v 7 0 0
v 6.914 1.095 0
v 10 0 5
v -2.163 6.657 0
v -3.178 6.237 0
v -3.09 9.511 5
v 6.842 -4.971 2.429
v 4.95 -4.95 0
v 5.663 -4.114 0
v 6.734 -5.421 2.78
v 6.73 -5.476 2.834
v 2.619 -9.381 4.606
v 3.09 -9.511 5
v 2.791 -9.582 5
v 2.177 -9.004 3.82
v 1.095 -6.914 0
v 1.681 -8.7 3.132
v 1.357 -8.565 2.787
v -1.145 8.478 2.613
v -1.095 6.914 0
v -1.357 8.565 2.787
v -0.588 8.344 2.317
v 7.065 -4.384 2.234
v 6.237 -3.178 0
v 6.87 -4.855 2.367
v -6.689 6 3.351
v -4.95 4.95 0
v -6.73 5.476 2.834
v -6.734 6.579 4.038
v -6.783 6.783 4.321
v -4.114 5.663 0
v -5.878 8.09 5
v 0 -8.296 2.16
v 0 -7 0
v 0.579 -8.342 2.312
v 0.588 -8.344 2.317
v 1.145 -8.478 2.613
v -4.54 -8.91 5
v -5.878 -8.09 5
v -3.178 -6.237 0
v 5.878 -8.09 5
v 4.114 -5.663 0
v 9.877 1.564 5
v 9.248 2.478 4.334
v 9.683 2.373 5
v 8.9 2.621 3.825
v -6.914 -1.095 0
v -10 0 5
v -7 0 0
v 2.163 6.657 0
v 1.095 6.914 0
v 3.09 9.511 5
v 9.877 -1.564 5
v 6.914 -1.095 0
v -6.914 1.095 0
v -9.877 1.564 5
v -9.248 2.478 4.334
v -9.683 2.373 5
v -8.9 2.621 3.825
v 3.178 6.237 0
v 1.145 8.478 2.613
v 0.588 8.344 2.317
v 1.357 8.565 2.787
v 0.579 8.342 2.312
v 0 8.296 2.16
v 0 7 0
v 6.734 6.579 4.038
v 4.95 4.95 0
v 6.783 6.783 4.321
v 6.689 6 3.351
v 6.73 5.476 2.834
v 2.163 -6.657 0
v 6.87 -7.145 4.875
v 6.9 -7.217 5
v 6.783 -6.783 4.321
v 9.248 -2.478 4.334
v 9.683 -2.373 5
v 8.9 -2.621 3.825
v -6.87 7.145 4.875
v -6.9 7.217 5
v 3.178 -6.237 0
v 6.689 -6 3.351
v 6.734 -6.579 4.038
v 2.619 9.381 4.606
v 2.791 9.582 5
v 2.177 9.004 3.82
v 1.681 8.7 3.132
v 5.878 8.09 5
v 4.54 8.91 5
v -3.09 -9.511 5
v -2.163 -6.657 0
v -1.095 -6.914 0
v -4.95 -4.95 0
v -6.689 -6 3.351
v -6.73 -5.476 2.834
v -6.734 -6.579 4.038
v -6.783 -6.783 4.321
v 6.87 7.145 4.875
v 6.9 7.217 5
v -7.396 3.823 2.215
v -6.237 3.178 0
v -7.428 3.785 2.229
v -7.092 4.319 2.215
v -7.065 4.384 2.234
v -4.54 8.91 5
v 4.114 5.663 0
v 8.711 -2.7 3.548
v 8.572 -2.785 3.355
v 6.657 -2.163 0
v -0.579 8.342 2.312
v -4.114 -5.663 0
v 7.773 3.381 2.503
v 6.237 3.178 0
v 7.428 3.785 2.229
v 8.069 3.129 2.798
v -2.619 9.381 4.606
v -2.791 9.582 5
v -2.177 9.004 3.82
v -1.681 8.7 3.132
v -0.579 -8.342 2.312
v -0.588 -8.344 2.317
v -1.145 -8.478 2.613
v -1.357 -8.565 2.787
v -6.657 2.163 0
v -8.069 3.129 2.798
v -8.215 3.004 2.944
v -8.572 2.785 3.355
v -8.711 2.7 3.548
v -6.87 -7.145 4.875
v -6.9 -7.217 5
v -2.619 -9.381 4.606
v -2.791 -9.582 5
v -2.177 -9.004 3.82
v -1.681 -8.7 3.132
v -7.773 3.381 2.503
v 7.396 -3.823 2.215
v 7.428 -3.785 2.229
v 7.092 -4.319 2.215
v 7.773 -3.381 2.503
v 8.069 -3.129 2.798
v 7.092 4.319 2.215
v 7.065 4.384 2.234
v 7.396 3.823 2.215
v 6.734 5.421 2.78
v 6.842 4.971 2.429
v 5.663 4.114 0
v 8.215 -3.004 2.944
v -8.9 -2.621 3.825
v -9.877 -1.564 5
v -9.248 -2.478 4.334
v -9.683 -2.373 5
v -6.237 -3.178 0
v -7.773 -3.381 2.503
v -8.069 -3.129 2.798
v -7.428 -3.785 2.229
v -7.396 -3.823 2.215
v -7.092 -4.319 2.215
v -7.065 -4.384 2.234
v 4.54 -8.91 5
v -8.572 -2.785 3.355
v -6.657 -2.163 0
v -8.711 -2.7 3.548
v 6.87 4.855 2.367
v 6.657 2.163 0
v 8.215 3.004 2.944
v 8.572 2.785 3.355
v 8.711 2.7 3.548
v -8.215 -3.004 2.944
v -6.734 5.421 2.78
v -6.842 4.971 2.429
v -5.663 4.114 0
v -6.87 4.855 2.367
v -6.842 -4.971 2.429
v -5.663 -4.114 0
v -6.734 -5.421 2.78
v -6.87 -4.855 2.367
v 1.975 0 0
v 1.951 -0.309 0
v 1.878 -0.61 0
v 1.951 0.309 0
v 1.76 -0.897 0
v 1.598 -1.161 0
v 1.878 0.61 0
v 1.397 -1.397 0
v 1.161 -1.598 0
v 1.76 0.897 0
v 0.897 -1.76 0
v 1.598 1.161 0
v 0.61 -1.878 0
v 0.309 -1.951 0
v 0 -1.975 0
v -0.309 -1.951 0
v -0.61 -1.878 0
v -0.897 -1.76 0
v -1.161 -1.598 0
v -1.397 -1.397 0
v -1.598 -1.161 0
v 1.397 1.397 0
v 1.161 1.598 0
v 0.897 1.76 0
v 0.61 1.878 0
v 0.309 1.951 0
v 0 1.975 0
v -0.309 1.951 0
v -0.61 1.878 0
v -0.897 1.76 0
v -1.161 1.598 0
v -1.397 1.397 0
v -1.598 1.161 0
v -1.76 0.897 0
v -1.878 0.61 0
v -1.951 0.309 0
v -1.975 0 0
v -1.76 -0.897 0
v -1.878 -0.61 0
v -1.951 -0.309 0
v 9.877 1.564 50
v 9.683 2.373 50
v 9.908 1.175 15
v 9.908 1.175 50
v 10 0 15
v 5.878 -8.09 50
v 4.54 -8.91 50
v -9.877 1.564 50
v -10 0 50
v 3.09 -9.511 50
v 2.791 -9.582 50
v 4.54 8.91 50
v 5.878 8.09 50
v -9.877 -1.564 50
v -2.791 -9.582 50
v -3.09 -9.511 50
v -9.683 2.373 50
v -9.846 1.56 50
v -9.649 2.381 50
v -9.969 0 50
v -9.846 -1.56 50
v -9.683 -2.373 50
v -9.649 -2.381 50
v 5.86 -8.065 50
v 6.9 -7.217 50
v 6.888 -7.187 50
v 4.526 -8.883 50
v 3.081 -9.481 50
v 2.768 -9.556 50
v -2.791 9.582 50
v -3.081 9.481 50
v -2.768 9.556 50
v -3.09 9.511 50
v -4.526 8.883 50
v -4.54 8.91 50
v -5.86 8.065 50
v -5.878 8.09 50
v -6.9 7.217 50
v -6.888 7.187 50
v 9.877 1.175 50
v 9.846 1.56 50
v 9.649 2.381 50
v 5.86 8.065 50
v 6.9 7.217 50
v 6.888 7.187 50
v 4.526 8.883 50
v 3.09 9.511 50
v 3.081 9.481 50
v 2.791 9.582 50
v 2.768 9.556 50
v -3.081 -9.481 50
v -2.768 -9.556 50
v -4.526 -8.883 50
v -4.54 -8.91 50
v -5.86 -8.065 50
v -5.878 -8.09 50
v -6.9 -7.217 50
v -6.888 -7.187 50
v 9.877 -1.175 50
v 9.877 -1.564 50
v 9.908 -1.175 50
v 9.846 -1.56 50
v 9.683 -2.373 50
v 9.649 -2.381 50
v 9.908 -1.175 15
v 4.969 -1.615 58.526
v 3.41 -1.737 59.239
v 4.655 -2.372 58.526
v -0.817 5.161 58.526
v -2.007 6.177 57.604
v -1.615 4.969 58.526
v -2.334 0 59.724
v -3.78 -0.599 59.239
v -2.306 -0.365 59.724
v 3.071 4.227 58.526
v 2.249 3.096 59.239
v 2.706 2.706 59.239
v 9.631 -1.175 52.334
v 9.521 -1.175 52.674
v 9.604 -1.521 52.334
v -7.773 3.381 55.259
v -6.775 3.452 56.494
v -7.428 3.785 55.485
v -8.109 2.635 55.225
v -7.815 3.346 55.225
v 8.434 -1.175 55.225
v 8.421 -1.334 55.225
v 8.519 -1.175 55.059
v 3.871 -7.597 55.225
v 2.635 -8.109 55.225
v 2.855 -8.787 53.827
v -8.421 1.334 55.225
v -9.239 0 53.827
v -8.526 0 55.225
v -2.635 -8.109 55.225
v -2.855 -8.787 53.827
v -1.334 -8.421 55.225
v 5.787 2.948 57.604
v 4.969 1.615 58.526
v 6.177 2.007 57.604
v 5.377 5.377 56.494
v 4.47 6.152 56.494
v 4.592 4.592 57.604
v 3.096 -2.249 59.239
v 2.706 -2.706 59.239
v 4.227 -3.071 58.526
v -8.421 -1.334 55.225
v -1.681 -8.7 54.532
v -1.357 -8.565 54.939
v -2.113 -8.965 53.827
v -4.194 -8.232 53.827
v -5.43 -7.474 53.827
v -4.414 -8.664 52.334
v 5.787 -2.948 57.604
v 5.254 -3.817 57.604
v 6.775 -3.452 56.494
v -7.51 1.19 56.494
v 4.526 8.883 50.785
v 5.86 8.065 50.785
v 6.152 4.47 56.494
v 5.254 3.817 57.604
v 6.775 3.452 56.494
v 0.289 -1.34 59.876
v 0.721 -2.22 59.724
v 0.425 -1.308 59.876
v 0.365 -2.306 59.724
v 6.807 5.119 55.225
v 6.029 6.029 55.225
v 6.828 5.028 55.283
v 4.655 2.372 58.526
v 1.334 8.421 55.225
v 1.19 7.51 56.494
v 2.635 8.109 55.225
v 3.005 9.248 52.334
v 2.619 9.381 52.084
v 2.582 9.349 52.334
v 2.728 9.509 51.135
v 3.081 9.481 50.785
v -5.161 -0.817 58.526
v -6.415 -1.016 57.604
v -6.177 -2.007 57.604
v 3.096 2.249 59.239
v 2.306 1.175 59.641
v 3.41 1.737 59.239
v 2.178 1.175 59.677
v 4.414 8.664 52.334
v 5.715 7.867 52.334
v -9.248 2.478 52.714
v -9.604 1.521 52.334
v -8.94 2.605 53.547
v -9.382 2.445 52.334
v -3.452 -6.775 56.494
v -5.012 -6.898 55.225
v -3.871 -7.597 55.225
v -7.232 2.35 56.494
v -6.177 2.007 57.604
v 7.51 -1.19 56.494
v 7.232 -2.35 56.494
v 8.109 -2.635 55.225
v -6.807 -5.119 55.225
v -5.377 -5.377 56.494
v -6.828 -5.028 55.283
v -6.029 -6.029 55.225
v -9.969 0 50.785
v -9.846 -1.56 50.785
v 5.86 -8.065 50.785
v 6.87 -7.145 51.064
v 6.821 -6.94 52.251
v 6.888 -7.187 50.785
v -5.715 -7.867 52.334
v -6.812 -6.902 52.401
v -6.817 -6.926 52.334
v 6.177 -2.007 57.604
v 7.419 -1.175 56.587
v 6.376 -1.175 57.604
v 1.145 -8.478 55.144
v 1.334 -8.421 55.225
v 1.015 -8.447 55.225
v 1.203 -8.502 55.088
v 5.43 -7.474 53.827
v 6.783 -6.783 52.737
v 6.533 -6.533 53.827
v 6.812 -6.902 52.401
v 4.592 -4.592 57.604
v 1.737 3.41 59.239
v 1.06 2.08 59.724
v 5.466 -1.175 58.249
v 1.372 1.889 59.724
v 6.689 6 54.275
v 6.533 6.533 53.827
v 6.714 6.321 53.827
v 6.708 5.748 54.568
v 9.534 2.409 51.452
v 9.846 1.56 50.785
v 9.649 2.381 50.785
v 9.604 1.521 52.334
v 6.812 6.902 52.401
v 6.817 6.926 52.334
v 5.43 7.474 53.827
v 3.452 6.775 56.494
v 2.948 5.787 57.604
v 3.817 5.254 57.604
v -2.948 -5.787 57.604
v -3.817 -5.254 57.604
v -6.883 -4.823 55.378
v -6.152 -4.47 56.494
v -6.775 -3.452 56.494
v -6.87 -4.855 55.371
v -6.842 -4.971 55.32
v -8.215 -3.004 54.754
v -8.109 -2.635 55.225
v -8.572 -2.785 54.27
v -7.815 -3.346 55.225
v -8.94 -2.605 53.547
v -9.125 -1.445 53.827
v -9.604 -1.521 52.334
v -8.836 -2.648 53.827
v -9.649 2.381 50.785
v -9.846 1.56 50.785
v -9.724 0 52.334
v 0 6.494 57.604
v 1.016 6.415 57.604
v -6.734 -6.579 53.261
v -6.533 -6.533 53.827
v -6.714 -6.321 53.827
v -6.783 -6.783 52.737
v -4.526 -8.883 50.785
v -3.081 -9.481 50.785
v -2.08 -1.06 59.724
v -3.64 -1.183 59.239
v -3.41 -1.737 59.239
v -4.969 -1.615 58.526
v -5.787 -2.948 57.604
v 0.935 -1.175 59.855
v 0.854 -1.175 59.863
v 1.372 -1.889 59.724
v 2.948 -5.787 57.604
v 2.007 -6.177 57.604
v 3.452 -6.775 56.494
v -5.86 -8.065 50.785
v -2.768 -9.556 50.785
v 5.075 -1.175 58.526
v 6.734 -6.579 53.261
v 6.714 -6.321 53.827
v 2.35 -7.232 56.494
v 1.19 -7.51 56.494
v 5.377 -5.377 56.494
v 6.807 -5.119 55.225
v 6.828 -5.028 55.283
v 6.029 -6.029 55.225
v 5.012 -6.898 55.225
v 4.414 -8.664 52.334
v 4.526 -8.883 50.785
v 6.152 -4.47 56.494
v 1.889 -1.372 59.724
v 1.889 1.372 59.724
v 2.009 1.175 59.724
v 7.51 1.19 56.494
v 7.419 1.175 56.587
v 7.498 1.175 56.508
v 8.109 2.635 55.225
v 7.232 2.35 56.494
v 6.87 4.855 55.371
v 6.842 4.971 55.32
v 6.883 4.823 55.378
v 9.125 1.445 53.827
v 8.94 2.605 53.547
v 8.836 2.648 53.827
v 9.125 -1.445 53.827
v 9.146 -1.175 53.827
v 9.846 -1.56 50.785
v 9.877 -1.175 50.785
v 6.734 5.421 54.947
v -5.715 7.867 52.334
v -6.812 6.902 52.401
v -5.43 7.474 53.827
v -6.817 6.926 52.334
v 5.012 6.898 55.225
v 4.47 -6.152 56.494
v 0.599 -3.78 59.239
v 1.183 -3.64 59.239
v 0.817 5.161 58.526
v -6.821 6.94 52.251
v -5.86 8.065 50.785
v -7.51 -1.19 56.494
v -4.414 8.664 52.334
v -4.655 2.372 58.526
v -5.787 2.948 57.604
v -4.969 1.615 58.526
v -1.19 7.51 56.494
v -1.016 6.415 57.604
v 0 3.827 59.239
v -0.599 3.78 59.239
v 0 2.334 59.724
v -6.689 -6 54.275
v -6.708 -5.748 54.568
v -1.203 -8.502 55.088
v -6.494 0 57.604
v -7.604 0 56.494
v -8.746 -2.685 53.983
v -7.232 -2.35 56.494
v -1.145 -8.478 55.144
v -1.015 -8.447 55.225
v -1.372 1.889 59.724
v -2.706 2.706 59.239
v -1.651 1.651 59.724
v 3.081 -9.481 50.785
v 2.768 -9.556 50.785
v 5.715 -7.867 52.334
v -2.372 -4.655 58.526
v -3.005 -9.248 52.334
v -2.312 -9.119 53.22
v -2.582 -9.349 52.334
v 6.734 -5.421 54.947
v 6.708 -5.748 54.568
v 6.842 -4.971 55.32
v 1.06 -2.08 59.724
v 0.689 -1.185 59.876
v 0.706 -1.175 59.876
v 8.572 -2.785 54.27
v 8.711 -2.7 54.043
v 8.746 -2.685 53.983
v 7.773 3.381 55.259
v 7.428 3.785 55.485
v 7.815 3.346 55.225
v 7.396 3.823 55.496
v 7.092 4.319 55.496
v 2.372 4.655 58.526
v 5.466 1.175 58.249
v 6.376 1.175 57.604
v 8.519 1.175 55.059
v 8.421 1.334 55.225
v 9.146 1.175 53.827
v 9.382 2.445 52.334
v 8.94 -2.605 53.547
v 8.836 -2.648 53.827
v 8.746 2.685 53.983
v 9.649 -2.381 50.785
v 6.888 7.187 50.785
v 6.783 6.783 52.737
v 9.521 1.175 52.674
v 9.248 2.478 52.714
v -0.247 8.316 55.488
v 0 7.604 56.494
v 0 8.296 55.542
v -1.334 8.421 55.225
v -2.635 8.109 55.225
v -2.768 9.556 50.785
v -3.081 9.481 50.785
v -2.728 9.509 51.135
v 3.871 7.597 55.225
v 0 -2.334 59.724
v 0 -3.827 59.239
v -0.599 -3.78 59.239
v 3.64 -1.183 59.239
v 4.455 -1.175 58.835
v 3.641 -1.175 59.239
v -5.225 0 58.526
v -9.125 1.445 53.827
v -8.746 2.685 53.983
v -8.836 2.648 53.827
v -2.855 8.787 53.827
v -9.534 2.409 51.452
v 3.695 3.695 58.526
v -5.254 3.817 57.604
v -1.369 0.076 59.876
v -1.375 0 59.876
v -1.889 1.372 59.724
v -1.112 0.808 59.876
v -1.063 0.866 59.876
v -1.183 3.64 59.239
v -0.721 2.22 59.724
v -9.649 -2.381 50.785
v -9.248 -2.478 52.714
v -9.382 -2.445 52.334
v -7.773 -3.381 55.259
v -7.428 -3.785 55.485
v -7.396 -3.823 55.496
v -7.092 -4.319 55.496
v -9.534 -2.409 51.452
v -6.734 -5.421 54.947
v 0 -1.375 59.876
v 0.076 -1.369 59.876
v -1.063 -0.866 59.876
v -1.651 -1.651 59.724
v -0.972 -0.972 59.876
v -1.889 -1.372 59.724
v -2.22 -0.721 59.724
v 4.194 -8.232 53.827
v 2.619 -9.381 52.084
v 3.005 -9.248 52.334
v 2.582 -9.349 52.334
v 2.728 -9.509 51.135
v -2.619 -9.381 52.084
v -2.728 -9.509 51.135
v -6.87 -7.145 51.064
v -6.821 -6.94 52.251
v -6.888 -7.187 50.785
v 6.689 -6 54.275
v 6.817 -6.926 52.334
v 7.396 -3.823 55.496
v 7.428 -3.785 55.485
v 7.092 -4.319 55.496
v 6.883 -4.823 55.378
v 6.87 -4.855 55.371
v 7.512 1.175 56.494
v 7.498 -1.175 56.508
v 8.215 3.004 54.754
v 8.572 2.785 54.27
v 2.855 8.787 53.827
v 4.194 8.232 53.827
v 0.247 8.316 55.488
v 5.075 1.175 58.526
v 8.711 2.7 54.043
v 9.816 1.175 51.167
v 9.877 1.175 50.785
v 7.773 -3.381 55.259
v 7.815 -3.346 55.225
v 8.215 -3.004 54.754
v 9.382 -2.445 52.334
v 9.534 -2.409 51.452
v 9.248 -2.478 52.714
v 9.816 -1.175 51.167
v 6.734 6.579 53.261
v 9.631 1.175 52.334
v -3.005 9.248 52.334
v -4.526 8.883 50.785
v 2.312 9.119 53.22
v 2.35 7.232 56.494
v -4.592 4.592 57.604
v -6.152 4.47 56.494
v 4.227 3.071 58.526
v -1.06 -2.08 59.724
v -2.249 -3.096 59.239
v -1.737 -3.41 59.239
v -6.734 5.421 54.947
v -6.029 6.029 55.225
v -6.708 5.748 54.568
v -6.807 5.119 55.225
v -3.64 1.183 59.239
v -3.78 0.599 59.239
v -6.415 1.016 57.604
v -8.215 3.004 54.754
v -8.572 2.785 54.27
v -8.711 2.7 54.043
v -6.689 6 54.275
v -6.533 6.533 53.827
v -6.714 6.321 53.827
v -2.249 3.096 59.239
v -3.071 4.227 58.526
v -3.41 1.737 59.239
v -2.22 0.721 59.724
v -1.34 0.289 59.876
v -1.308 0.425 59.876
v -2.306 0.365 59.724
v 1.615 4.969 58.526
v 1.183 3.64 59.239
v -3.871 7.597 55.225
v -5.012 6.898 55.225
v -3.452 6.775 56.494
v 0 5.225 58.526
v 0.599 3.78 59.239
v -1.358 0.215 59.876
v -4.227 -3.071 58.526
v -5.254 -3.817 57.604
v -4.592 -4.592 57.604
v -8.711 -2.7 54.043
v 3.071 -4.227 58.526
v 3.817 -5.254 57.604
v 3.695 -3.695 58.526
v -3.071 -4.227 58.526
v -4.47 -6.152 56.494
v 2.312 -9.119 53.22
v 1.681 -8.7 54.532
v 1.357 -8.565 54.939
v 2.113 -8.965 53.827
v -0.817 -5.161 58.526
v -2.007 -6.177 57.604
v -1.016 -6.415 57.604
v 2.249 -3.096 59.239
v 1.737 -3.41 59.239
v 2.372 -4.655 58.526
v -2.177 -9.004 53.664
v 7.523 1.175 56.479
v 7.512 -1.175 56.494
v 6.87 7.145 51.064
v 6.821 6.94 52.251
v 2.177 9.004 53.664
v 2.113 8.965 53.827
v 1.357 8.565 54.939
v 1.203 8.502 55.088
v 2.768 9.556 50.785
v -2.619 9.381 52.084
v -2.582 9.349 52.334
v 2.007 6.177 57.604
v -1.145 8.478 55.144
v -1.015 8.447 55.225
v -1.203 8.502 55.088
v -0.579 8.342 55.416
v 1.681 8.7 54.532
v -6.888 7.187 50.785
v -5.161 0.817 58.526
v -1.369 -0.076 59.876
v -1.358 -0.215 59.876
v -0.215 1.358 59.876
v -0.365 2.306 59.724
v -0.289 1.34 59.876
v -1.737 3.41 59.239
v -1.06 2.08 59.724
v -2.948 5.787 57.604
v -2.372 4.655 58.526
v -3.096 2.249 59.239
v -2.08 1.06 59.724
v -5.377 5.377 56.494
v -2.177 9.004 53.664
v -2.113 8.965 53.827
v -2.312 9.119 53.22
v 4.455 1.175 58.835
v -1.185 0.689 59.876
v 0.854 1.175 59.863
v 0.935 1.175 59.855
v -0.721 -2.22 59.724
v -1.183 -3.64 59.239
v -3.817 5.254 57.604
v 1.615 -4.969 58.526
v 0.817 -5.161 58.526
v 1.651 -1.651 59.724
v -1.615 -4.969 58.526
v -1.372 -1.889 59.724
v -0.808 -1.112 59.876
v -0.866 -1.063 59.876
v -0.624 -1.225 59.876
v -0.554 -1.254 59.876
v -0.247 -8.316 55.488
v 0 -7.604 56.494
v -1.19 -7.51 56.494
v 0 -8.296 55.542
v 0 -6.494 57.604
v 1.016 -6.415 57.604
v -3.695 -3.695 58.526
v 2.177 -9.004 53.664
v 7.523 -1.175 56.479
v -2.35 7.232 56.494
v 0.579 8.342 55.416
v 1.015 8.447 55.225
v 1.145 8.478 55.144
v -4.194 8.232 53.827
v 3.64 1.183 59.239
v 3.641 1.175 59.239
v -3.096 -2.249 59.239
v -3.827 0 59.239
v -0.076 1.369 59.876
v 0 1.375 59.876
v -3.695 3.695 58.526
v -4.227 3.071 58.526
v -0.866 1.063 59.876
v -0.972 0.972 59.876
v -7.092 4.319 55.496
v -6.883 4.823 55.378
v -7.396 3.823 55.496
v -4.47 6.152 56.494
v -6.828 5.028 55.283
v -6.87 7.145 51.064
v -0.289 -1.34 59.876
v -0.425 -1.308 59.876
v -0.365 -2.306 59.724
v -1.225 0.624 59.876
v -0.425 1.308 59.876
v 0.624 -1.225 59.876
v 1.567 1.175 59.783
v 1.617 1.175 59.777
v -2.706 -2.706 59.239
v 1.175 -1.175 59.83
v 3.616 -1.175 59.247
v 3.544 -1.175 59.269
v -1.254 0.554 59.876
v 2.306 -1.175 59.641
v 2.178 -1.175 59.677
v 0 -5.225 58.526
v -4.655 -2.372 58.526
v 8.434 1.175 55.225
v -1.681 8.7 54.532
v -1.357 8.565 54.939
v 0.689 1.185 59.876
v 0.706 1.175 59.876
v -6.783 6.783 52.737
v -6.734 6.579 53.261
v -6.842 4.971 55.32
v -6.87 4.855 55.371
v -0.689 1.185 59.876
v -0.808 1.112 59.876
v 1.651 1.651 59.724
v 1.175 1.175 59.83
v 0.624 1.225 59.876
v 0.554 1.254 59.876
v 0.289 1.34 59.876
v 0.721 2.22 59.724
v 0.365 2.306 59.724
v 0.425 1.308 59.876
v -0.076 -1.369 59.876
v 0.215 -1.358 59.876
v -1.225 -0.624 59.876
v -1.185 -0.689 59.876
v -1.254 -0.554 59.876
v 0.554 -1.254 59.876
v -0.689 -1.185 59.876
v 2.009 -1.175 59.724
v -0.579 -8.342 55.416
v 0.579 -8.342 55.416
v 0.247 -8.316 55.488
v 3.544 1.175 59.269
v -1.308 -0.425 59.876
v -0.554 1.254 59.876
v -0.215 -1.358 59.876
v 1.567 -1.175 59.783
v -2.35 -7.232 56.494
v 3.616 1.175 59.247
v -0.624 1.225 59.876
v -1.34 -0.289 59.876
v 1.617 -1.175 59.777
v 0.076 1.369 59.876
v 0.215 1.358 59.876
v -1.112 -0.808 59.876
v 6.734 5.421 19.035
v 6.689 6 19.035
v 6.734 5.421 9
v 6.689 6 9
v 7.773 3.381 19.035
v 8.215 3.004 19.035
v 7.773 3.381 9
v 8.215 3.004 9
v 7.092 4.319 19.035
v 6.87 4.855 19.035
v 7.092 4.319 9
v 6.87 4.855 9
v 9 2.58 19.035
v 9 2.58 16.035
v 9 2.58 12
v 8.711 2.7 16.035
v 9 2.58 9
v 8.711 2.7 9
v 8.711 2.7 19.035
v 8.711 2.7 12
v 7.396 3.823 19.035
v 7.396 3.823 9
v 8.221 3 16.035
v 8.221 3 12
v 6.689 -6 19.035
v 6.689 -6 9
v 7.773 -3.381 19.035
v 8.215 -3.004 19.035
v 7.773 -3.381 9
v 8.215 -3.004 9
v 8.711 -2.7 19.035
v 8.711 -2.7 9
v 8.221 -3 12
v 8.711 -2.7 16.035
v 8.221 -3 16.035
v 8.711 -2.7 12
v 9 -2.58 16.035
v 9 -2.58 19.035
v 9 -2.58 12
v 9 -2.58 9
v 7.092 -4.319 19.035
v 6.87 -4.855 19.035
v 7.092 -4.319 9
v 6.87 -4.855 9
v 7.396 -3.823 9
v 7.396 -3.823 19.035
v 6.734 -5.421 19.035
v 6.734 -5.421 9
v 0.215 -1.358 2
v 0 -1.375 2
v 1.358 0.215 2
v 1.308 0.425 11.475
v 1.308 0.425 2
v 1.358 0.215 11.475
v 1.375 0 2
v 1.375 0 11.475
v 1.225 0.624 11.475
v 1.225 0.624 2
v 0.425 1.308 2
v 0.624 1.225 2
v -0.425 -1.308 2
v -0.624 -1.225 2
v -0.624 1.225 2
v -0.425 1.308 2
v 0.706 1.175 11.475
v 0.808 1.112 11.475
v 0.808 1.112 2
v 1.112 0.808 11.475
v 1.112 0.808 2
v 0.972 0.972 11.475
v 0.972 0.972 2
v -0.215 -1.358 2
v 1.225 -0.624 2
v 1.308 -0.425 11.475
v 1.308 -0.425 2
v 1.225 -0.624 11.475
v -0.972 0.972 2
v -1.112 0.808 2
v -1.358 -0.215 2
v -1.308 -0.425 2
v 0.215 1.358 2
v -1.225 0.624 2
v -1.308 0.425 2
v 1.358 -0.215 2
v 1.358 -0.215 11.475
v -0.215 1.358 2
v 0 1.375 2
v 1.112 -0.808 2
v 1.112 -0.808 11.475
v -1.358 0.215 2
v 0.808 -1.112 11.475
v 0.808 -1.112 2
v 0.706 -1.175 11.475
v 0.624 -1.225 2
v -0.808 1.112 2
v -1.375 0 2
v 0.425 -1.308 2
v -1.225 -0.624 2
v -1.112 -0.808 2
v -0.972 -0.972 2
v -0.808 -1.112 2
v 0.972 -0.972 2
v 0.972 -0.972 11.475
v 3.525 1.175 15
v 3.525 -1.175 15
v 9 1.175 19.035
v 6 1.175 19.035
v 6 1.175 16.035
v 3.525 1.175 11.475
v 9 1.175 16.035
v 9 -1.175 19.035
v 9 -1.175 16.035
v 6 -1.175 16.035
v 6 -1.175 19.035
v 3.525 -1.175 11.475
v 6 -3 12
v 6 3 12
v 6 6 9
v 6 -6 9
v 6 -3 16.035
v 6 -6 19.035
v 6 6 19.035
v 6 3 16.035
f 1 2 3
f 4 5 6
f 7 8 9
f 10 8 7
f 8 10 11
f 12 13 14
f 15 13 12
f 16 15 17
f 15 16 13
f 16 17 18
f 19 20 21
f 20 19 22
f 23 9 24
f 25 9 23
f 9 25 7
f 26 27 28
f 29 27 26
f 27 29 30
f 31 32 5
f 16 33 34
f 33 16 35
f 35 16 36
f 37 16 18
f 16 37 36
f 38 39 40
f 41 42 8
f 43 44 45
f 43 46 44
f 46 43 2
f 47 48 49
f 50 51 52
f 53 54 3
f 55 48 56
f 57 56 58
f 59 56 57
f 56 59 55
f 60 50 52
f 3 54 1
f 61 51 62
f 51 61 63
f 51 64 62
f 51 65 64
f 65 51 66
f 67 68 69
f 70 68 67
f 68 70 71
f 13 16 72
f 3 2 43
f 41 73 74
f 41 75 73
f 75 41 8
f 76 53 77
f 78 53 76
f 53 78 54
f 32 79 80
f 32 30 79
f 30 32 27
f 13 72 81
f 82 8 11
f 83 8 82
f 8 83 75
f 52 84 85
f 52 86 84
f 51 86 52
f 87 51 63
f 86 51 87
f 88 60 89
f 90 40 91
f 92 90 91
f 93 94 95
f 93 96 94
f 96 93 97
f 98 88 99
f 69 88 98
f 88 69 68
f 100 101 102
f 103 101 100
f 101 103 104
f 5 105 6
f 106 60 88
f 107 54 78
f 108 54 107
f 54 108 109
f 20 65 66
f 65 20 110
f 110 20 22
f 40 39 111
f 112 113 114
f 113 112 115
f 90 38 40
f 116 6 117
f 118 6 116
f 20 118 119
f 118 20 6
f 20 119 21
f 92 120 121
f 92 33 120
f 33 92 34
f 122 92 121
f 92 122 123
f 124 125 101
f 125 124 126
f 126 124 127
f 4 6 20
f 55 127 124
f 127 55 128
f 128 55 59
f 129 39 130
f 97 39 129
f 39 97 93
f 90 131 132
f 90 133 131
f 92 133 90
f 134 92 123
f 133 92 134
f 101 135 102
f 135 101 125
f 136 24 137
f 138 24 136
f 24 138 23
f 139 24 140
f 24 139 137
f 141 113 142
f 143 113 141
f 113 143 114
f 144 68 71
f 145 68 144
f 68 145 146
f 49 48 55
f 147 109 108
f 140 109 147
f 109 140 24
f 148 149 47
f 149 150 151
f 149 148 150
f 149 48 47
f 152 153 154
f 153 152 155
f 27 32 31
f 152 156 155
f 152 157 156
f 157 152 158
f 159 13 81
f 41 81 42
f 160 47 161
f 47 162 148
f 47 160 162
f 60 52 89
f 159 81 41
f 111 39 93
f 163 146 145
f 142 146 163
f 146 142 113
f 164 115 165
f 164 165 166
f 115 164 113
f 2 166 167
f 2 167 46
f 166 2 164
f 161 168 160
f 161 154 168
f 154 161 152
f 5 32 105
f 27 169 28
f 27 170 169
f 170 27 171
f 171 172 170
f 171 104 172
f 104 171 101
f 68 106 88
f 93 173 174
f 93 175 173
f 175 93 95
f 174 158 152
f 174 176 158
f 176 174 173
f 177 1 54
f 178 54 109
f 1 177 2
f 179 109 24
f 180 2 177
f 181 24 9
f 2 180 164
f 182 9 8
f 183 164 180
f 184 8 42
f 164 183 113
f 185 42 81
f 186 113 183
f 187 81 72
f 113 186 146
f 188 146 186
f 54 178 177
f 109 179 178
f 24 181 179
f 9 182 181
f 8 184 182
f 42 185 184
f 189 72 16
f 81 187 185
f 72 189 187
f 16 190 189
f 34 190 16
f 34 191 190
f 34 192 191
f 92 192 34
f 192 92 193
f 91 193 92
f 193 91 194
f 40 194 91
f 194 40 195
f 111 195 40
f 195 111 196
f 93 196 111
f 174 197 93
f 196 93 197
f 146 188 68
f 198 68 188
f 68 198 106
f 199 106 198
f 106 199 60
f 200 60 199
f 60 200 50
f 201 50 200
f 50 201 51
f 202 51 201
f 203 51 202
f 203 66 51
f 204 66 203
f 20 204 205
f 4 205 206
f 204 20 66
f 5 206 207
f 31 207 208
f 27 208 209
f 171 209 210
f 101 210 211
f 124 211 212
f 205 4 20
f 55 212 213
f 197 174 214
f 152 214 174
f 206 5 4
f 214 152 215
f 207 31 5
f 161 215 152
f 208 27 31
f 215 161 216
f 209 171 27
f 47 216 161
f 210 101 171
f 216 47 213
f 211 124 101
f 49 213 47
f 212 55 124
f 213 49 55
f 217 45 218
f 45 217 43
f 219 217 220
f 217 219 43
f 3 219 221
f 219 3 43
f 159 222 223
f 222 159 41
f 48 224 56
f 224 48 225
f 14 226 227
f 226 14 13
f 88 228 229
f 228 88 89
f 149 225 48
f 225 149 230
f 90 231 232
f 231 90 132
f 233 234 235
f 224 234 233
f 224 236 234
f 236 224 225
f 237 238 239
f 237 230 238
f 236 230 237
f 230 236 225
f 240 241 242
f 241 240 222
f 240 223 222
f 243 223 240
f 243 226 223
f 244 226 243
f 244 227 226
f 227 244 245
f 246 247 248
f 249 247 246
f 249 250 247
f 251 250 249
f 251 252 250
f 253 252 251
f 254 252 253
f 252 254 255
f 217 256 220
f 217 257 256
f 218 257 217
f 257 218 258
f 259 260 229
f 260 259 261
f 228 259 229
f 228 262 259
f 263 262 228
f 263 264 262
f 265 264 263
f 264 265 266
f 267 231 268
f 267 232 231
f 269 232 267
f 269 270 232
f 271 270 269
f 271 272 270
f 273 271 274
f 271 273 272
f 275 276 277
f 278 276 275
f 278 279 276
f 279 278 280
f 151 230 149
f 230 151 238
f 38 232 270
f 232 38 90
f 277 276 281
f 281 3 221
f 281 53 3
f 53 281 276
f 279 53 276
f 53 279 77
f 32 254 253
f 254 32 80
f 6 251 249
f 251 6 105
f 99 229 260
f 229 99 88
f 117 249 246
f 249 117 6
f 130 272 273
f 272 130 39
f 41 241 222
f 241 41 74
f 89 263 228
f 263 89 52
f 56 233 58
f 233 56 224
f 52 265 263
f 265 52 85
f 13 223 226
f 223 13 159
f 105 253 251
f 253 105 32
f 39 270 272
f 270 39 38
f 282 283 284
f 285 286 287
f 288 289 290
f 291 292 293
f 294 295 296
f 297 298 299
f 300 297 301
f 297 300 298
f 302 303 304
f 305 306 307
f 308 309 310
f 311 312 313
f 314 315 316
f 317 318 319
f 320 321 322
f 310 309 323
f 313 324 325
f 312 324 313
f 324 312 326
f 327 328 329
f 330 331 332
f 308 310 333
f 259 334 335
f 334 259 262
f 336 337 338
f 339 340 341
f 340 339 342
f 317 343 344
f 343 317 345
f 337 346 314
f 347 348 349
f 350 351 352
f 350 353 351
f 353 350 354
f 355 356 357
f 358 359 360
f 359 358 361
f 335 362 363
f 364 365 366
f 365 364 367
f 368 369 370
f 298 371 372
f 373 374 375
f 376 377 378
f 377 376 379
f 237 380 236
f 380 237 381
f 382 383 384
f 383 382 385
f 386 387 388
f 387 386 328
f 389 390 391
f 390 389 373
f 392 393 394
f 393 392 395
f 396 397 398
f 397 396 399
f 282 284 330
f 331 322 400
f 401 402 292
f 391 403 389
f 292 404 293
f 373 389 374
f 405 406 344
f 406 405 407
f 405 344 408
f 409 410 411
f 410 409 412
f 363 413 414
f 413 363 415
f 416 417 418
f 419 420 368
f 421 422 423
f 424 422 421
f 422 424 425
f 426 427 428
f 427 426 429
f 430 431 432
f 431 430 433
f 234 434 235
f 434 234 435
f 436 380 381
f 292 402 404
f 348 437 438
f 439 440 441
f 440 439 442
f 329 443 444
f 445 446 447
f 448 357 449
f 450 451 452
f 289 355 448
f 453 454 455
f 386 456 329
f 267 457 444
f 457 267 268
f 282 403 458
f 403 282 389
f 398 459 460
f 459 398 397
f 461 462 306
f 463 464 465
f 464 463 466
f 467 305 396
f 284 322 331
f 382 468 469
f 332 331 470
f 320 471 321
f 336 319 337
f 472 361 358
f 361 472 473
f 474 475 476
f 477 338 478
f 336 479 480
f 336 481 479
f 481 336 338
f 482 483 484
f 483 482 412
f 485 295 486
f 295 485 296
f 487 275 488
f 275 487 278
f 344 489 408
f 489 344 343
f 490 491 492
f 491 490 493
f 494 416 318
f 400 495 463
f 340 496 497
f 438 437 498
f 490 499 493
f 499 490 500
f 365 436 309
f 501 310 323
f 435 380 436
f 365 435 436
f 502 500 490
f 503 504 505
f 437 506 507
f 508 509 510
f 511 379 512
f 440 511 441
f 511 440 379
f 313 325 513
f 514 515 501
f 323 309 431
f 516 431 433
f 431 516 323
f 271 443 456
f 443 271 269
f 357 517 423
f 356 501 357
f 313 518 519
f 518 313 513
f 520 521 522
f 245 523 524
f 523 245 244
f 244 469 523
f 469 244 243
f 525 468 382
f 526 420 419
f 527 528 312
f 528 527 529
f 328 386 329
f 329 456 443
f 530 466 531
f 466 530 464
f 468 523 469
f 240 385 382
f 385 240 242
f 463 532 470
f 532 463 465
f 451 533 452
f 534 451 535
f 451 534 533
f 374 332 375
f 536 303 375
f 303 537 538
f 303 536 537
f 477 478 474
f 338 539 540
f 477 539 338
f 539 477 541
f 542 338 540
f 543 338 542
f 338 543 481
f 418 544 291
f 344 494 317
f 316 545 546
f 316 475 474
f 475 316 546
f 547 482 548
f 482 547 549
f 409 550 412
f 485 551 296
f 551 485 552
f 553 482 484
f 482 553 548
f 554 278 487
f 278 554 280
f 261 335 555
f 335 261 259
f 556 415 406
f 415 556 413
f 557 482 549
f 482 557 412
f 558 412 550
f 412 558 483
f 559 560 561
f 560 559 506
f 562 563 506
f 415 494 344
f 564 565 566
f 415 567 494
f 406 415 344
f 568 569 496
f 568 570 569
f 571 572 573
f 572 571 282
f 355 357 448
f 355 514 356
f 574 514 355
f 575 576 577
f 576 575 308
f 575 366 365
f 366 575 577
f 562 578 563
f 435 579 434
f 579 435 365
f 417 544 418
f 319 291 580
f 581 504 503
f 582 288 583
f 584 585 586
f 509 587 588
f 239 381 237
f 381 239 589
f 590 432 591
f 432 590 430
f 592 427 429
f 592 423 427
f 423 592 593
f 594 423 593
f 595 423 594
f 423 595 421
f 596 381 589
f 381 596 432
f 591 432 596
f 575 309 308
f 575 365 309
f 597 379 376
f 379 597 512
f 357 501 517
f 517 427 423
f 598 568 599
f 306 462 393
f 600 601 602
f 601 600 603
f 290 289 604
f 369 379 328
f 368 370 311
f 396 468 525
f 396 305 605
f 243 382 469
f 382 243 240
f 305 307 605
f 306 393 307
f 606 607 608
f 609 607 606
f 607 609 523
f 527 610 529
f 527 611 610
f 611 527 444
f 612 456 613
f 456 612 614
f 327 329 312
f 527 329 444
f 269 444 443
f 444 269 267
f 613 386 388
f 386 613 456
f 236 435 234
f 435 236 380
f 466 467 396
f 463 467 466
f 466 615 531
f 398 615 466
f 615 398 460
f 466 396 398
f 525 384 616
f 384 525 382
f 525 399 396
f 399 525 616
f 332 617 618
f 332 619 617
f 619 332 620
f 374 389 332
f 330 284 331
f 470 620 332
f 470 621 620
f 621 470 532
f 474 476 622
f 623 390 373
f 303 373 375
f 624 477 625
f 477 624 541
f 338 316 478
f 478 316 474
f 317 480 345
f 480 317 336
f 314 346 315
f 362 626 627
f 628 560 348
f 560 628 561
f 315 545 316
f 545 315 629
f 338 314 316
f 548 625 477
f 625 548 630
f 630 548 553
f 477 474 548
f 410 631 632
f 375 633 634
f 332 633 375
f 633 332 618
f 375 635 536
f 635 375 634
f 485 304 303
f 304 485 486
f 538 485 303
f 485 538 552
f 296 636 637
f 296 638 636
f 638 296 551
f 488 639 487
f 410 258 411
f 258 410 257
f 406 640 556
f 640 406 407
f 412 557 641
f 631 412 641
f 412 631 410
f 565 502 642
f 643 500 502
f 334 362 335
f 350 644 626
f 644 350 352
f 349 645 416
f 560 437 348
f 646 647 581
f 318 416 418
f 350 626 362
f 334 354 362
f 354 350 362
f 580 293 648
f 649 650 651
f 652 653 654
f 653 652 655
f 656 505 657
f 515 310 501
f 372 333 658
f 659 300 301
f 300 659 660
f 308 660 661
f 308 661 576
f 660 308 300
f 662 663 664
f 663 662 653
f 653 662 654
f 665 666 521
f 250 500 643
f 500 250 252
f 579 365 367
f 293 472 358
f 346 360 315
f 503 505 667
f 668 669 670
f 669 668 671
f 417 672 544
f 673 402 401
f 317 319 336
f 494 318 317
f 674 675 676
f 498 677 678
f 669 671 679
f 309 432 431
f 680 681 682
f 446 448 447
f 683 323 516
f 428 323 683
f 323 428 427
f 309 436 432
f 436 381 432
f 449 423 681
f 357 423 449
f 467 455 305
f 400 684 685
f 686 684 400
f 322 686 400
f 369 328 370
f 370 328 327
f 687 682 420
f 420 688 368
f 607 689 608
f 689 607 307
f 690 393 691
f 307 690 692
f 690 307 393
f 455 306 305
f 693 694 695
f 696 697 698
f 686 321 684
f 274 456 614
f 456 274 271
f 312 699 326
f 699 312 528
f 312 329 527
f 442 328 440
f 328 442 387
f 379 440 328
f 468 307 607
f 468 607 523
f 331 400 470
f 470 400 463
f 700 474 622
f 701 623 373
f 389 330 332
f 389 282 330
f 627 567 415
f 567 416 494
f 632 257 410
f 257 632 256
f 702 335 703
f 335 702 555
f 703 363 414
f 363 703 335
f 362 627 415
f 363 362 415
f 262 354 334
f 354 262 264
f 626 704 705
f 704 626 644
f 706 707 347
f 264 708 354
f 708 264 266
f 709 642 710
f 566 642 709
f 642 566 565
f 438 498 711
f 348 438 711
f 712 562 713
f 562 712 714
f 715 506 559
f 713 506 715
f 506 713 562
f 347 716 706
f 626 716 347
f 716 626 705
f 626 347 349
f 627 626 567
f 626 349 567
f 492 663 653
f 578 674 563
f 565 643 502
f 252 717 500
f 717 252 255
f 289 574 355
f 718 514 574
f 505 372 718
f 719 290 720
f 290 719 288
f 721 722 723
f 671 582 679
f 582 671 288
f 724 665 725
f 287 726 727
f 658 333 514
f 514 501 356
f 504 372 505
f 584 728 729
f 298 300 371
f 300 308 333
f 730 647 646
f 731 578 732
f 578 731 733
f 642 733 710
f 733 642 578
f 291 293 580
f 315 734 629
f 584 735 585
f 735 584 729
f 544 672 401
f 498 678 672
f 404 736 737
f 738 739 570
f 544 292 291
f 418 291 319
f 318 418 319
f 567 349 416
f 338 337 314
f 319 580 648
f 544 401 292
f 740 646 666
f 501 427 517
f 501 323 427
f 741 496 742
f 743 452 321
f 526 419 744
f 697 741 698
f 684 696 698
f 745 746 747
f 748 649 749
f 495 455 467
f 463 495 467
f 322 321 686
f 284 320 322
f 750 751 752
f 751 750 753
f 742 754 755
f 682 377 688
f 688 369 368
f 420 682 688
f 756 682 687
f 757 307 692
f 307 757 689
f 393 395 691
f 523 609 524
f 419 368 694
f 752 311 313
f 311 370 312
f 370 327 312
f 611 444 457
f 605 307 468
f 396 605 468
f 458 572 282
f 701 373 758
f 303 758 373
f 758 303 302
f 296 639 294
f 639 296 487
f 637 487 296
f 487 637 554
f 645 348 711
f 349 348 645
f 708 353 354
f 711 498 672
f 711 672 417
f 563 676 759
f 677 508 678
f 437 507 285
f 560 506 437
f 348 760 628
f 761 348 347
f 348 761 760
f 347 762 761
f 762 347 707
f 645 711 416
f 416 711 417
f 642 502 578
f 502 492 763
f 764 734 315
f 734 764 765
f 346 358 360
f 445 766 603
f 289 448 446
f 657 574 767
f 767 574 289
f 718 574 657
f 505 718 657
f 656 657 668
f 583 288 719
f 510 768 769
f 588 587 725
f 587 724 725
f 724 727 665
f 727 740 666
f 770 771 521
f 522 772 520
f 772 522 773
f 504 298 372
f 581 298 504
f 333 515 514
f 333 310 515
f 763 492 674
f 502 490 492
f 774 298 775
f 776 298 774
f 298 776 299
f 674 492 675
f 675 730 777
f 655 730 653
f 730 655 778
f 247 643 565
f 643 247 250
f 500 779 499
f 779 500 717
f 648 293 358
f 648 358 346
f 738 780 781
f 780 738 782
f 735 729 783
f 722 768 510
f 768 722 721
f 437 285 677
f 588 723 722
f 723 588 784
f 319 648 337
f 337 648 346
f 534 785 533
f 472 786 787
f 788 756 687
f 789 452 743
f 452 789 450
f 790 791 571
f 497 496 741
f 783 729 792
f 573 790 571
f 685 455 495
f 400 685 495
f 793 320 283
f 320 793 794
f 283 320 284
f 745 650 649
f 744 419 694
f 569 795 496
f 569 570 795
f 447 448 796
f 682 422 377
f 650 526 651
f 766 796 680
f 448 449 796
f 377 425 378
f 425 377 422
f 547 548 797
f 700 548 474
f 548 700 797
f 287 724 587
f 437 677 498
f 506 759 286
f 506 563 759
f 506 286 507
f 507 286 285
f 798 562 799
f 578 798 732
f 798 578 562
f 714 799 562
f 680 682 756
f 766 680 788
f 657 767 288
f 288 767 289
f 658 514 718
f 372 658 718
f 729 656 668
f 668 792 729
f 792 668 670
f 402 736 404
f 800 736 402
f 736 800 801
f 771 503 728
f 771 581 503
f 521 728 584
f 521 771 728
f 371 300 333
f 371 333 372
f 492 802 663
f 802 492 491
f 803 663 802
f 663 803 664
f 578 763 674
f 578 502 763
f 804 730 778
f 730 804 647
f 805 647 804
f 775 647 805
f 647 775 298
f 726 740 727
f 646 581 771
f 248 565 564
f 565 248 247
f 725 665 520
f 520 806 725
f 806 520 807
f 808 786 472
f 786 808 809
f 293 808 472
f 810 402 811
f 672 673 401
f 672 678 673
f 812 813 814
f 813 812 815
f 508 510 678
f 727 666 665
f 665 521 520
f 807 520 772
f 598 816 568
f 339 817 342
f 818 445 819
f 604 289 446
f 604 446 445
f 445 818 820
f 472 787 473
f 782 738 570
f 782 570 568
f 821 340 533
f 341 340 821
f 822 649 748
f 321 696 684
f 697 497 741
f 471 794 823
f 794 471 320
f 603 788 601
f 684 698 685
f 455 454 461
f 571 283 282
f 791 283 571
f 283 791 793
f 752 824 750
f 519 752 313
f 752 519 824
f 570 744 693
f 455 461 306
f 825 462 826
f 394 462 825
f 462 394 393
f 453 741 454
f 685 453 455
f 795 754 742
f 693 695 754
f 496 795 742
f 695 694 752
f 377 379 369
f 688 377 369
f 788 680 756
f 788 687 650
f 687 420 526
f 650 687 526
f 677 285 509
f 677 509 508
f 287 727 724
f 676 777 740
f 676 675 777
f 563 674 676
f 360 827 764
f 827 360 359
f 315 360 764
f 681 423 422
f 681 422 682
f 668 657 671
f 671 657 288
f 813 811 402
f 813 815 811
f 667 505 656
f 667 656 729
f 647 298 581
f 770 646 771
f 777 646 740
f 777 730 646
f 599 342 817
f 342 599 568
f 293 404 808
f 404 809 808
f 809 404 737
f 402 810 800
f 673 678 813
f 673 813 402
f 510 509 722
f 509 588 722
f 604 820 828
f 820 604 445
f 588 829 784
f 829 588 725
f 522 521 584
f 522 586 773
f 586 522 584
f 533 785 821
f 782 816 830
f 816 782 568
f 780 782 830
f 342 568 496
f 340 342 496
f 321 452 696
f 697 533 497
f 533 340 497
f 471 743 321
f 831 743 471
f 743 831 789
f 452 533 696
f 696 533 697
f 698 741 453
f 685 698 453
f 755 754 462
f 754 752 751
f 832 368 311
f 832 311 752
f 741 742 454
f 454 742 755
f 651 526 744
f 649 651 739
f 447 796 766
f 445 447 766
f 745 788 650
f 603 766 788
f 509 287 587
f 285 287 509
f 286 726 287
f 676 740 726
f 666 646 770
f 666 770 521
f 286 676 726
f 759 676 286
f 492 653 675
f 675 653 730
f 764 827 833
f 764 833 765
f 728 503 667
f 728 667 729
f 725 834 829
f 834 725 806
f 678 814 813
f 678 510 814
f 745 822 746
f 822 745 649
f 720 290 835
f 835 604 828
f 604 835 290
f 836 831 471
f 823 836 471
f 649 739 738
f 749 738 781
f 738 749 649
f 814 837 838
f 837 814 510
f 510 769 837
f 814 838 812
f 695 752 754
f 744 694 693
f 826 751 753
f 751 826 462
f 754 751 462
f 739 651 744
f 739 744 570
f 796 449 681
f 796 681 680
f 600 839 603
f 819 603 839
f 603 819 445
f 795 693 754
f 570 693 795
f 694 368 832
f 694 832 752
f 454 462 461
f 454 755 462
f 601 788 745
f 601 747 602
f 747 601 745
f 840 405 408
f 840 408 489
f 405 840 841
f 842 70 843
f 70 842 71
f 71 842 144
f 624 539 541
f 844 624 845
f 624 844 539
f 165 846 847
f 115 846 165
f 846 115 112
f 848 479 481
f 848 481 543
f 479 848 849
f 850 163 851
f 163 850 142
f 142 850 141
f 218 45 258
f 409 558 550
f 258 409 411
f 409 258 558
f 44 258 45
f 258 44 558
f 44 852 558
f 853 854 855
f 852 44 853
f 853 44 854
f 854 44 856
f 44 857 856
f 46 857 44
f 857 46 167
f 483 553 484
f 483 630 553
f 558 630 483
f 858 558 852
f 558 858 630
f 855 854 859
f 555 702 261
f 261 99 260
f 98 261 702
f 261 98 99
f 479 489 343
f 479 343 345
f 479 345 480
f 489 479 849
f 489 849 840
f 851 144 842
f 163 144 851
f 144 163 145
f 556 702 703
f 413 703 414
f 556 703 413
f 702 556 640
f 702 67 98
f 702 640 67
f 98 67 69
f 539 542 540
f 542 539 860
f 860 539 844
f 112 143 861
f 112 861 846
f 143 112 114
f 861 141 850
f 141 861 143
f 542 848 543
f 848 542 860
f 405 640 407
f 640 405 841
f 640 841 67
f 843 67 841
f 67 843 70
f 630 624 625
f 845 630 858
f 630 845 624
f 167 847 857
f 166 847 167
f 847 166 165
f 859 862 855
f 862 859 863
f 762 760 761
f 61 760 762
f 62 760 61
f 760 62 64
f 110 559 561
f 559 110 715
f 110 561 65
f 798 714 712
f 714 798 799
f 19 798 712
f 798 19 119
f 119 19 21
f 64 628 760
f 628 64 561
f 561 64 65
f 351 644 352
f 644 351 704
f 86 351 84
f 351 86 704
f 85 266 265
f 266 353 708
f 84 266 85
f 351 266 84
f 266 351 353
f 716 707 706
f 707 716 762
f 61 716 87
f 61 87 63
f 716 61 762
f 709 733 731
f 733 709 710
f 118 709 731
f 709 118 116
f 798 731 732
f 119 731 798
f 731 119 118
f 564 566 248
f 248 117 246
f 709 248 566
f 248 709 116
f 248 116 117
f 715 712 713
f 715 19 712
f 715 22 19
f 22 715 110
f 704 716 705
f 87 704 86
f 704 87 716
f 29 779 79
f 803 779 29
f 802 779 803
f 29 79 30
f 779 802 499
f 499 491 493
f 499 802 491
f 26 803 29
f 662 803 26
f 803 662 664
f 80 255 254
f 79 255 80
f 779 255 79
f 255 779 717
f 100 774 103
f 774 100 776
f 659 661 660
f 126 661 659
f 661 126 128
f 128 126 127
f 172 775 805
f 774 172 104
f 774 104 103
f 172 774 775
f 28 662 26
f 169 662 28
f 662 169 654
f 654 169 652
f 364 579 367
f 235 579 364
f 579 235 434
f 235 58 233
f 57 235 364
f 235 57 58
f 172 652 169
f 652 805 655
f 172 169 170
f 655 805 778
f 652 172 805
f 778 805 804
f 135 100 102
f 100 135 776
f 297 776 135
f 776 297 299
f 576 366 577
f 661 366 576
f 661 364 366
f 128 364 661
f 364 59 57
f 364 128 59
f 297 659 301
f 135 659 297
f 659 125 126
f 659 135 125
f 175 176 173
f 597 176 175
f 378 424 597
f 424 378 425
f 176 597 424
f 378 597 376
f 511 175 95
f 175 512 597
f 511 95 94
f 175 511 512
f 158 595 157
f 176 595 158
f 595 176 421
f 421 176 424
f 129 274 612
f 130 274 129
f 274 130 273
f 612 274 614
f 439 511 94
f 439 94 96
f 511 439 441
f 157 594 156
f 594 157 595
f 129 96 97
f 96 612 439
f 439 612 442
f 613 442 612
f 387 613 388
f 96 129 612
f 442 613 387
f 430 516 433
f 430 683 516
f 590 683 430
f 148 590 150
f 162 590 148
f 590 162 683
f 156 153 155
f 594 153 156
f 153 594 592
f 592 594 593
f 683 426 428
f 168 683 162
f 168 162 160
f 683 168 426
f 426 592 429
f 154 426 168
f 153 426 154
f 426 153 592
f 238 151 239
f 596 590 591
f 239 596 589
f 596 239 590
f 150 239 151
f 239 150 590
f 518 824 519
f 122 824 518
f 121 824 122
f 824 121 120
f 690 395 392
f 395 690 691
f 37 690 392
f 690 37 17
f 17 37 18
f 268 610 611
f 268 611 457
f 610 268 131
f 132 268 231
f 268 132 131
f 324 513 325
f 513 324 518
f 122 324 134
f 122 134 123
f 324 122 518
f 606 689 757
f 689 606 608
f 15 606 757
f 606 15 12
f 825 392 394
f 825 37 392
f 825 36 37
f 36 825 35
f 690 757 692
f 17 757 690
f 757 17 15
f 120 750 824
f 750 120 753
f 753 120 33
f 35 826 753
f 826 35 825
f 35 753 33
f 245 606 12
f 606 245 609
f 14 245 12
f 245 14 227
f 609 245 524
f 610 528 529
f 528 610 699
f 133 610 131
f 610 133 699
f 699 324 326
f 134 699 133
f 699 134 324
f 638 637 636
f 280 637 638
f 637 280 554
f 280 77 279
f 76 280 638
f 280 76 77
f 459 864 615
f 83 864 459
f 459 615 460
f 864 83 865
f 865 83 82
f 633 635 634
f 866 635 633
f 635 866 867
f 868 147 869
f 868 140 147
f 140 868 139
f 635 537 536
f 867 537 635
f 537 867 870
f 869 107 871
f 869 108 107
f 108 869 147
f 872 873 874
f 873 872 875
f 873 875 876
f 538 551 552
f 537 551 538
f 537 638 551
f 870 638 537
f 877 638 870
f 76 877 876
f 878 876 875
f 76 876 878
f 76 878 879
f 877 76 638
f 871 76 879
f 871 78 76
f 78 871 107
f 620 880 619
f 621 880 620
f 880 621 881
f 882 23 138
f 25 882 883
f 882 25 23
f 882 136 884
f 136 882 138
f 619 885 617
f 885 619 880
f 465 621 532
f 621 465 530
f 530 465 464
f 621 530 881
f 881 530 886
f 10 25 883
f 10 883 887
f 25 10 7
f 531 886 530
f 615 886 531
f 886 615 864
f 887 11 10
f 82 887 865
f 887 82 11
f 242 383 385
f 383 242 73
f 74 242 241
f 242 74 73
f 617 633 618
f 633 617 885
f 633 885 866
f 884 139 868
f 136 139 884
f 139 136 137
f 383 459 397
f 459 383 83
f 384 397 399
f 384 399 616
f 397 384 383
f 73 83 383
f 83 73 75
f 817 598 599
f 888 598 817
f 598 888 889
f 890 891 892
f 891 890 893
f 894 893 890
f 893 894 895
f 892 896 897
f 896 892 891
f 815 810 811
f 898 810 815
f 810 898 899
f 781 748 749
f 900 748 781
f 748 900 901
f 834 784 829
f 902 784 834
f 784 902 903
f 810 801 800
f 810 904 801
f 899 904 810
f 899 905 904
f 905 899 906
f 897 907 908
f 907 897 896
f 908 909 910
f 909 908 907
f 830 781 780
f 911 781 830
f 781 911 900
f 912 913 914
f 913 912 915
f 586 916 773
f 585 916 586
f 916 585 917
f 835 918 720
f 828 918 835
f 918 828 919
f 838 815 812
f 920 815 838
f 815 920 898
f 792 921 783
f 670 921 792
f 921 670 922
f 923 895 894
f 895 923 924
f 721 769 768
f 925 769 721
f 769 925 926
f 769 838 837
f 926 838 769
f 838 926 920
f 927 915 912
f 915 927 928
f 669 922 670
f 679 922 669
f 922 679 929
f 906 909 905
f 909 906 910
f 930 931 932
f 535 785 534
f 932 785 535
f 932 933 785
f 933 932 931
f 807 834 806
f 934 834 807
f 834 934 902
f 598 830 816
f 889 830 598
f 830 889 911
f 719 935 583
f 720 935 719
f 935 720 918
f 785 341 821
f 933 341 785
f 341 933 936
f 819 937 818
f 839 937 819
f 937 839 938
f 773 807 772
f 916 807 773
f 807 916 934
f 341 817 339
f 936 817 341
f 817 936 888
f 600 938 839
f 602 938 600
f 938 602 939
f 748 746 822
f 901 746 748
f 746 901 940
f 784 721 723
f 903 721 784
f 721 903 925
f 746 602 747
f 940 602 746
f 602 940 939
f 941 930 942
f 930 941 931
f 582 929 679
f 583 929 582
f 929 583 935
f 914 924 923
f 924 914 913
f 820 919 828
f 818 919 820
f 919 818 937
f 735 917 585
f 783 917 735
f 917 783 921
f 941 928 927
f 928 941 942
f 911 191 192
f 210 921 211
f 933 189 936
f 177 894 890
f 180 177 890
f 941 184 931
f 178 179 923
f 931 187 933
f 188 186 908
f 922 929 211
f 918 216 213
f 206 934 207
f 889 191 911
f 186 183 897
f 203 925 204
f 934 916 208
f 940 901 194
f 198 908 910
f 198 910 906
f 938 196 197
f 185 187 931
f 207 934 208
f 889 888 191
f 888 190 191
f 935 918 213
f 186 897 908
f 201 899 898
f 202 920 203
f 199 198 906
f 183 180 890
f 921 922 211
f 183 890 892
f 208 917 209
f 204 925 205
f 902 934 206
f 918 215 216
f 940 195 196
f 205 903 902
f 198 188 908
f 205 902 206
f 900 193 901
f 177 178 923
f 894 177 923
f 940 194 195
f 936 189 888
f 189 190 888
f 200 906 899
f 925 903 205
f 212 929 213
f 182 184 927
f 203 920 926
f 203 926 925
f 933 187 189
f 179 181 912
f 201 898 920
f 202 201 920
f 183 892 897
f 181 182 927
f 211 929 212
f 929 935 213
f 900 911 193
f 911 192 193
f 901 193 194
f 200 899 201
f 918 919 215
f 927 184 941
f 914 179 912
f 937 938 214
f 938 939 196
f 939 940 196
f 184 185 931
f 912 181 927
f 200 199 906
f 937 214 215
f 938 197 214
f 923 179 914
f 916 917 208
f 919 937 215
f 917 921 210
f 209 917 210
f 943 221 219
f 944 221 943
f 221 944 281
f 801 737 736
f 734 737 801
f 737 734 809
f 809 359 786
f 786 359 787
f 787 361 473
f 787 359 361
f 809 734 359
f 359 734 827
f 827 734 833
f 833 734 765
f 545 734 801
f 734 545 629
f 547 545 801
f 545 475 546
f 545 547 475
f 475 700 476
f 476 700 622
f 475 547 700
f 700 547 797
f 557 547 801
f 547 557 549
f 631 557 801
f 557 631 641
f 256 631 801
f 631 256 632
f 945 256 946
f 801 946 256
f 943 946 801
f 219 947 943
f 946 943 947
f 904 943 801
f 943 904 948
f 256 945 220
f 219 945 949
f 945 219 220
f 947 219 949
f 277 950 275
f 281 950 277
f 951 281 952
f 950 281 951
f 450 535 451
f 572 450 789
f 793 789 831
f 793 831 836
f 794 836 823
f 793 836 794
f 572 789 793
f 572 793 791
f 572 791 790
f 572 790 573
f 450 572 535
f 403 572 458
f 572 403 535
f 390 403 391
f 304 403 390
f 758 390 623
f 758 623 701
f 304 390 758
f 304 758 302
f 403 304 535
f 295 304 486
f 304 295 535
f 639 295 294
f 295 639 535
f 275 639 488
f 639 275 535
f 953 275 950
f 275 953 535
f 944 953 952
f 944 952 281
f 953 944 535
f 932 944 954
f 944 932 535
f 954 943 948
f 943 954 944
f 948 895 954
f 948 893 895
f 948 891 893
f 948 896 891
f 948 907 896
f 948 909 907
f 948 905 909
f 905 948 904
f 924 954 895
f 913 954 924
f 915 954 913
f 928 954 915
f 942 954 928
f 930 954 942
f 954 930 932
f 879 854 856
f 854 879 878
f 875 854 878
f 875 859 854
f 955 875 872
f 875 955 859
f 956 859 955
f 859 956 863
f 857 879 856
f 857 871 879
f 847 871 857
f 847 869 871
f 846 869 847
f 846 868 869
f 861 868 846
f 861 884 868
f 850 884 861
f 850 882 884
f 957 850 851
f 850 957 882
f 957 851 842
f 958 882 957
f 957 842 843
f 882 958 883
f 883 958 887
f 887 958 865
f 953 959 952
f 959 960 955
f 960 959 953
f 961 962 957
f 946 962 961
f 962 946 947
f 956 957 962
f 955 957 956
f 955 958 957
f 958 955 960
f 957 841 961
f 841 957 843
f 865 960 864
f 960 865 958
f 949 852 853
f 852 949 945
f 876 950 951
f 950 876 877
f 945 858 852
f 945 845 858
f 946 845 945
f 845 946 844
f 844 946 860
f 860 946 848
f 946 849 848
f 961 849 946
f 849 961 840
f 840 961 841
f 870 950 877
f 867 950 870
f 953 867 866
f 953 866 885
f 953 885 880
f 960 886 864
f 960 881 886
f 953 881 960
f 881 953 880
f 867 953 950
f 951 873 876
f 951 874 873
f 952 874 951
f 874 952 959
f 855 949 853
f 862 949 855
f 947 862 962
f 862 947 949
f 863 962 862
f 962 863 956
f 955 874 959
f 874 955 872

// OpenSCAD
// Diameter of hole for the hex wrench
hex_size = 2.2;

// Increase slot size by this amount
hole_delta = 0.15;

// Diameter of the handle
handle_diameter = 20;

handle(hex_size);

module handle(hex_size)
{
  hex_radius = (hex_size + hole_delta) / 2;
  hex_size = hex_size + hole_delta;
  handle_radius = handle_diameter / 2;
  knurl_offset = handle_radius * 1.2;
  handle_height = 50;
  slot_width = 1.2 * handle_radius;
  zip_tie_back = 0.6 * handle_radius;
  slot_bottom = 15;

  $fn=40;									// Control quality of mesh

  hole_radius = hex_radius + .2;	// Give a little more room for small hole

  difference()
    {
      union()
      {
	cylinder(h = 5, r1 = handle_radius - 3, r2 = handle_radius);
	translate(v=[0, 0, 5])
	  cylinder(h = handle_height - 5, r = handle_radius);
	translate(v=[0, 0, handle_height])
	  sphere(handle_radius);
      }

      for (angle = [30:60:360])
	translate(v=[knurl_offset * cos(angle), knurl_offset * sin(angle), 0])
	  cylinder(h = handle_height + handle_radius, r = handle_radius / 2.7);

      // Shaft hole
      cylinder(h = handle_height + handle_radius, r = hole_radius);

      // Small cone at bottom
      cylinder(h = 2, r1 = hole_radius + .6, r2 = hole_radius);

      // Slot for the wrench
      translate(v=[0, -hex_size / 2, slot_bottom])
	cube(size = [handle_radius, hex_size, handle_height + handle_radius]);

      // Slot for bend in wrench
      translate(v=[0, -hex_size / 2, slot_bottom - 1.5 * hex_size])
	cube(size = [1.5 * hex_size, hex_size, 2 * hex_size]);

      // Lower slot for zip-tie
      translate(v=[zip_tie_back, -slot_width / 2, slot_bottom - 6])
	cube(size=[3, slot_width, 3]);

      // Upper slot for zip tie
      translate(v=[zip_tie_back, -slot_width / 2, slot_bottom + sin(60) * hex_size - 1])
	cube(size=[3, slot_width, 3]);

      // Zip Tie Opening
      translate(v=[zip_tie_back, slot_width / 4, slot_bottom - 6])
	cube(size=[3, slot_width / 4, 6 + sin(60) * hex_size + 2]);

      translate(v=[zip_tie_back, -slot_width / 2, slot_bottom - 6])
	cube(size=[3, slot_width / 4, 6 + sin(60) * hex_size + 2]);
    }
}
